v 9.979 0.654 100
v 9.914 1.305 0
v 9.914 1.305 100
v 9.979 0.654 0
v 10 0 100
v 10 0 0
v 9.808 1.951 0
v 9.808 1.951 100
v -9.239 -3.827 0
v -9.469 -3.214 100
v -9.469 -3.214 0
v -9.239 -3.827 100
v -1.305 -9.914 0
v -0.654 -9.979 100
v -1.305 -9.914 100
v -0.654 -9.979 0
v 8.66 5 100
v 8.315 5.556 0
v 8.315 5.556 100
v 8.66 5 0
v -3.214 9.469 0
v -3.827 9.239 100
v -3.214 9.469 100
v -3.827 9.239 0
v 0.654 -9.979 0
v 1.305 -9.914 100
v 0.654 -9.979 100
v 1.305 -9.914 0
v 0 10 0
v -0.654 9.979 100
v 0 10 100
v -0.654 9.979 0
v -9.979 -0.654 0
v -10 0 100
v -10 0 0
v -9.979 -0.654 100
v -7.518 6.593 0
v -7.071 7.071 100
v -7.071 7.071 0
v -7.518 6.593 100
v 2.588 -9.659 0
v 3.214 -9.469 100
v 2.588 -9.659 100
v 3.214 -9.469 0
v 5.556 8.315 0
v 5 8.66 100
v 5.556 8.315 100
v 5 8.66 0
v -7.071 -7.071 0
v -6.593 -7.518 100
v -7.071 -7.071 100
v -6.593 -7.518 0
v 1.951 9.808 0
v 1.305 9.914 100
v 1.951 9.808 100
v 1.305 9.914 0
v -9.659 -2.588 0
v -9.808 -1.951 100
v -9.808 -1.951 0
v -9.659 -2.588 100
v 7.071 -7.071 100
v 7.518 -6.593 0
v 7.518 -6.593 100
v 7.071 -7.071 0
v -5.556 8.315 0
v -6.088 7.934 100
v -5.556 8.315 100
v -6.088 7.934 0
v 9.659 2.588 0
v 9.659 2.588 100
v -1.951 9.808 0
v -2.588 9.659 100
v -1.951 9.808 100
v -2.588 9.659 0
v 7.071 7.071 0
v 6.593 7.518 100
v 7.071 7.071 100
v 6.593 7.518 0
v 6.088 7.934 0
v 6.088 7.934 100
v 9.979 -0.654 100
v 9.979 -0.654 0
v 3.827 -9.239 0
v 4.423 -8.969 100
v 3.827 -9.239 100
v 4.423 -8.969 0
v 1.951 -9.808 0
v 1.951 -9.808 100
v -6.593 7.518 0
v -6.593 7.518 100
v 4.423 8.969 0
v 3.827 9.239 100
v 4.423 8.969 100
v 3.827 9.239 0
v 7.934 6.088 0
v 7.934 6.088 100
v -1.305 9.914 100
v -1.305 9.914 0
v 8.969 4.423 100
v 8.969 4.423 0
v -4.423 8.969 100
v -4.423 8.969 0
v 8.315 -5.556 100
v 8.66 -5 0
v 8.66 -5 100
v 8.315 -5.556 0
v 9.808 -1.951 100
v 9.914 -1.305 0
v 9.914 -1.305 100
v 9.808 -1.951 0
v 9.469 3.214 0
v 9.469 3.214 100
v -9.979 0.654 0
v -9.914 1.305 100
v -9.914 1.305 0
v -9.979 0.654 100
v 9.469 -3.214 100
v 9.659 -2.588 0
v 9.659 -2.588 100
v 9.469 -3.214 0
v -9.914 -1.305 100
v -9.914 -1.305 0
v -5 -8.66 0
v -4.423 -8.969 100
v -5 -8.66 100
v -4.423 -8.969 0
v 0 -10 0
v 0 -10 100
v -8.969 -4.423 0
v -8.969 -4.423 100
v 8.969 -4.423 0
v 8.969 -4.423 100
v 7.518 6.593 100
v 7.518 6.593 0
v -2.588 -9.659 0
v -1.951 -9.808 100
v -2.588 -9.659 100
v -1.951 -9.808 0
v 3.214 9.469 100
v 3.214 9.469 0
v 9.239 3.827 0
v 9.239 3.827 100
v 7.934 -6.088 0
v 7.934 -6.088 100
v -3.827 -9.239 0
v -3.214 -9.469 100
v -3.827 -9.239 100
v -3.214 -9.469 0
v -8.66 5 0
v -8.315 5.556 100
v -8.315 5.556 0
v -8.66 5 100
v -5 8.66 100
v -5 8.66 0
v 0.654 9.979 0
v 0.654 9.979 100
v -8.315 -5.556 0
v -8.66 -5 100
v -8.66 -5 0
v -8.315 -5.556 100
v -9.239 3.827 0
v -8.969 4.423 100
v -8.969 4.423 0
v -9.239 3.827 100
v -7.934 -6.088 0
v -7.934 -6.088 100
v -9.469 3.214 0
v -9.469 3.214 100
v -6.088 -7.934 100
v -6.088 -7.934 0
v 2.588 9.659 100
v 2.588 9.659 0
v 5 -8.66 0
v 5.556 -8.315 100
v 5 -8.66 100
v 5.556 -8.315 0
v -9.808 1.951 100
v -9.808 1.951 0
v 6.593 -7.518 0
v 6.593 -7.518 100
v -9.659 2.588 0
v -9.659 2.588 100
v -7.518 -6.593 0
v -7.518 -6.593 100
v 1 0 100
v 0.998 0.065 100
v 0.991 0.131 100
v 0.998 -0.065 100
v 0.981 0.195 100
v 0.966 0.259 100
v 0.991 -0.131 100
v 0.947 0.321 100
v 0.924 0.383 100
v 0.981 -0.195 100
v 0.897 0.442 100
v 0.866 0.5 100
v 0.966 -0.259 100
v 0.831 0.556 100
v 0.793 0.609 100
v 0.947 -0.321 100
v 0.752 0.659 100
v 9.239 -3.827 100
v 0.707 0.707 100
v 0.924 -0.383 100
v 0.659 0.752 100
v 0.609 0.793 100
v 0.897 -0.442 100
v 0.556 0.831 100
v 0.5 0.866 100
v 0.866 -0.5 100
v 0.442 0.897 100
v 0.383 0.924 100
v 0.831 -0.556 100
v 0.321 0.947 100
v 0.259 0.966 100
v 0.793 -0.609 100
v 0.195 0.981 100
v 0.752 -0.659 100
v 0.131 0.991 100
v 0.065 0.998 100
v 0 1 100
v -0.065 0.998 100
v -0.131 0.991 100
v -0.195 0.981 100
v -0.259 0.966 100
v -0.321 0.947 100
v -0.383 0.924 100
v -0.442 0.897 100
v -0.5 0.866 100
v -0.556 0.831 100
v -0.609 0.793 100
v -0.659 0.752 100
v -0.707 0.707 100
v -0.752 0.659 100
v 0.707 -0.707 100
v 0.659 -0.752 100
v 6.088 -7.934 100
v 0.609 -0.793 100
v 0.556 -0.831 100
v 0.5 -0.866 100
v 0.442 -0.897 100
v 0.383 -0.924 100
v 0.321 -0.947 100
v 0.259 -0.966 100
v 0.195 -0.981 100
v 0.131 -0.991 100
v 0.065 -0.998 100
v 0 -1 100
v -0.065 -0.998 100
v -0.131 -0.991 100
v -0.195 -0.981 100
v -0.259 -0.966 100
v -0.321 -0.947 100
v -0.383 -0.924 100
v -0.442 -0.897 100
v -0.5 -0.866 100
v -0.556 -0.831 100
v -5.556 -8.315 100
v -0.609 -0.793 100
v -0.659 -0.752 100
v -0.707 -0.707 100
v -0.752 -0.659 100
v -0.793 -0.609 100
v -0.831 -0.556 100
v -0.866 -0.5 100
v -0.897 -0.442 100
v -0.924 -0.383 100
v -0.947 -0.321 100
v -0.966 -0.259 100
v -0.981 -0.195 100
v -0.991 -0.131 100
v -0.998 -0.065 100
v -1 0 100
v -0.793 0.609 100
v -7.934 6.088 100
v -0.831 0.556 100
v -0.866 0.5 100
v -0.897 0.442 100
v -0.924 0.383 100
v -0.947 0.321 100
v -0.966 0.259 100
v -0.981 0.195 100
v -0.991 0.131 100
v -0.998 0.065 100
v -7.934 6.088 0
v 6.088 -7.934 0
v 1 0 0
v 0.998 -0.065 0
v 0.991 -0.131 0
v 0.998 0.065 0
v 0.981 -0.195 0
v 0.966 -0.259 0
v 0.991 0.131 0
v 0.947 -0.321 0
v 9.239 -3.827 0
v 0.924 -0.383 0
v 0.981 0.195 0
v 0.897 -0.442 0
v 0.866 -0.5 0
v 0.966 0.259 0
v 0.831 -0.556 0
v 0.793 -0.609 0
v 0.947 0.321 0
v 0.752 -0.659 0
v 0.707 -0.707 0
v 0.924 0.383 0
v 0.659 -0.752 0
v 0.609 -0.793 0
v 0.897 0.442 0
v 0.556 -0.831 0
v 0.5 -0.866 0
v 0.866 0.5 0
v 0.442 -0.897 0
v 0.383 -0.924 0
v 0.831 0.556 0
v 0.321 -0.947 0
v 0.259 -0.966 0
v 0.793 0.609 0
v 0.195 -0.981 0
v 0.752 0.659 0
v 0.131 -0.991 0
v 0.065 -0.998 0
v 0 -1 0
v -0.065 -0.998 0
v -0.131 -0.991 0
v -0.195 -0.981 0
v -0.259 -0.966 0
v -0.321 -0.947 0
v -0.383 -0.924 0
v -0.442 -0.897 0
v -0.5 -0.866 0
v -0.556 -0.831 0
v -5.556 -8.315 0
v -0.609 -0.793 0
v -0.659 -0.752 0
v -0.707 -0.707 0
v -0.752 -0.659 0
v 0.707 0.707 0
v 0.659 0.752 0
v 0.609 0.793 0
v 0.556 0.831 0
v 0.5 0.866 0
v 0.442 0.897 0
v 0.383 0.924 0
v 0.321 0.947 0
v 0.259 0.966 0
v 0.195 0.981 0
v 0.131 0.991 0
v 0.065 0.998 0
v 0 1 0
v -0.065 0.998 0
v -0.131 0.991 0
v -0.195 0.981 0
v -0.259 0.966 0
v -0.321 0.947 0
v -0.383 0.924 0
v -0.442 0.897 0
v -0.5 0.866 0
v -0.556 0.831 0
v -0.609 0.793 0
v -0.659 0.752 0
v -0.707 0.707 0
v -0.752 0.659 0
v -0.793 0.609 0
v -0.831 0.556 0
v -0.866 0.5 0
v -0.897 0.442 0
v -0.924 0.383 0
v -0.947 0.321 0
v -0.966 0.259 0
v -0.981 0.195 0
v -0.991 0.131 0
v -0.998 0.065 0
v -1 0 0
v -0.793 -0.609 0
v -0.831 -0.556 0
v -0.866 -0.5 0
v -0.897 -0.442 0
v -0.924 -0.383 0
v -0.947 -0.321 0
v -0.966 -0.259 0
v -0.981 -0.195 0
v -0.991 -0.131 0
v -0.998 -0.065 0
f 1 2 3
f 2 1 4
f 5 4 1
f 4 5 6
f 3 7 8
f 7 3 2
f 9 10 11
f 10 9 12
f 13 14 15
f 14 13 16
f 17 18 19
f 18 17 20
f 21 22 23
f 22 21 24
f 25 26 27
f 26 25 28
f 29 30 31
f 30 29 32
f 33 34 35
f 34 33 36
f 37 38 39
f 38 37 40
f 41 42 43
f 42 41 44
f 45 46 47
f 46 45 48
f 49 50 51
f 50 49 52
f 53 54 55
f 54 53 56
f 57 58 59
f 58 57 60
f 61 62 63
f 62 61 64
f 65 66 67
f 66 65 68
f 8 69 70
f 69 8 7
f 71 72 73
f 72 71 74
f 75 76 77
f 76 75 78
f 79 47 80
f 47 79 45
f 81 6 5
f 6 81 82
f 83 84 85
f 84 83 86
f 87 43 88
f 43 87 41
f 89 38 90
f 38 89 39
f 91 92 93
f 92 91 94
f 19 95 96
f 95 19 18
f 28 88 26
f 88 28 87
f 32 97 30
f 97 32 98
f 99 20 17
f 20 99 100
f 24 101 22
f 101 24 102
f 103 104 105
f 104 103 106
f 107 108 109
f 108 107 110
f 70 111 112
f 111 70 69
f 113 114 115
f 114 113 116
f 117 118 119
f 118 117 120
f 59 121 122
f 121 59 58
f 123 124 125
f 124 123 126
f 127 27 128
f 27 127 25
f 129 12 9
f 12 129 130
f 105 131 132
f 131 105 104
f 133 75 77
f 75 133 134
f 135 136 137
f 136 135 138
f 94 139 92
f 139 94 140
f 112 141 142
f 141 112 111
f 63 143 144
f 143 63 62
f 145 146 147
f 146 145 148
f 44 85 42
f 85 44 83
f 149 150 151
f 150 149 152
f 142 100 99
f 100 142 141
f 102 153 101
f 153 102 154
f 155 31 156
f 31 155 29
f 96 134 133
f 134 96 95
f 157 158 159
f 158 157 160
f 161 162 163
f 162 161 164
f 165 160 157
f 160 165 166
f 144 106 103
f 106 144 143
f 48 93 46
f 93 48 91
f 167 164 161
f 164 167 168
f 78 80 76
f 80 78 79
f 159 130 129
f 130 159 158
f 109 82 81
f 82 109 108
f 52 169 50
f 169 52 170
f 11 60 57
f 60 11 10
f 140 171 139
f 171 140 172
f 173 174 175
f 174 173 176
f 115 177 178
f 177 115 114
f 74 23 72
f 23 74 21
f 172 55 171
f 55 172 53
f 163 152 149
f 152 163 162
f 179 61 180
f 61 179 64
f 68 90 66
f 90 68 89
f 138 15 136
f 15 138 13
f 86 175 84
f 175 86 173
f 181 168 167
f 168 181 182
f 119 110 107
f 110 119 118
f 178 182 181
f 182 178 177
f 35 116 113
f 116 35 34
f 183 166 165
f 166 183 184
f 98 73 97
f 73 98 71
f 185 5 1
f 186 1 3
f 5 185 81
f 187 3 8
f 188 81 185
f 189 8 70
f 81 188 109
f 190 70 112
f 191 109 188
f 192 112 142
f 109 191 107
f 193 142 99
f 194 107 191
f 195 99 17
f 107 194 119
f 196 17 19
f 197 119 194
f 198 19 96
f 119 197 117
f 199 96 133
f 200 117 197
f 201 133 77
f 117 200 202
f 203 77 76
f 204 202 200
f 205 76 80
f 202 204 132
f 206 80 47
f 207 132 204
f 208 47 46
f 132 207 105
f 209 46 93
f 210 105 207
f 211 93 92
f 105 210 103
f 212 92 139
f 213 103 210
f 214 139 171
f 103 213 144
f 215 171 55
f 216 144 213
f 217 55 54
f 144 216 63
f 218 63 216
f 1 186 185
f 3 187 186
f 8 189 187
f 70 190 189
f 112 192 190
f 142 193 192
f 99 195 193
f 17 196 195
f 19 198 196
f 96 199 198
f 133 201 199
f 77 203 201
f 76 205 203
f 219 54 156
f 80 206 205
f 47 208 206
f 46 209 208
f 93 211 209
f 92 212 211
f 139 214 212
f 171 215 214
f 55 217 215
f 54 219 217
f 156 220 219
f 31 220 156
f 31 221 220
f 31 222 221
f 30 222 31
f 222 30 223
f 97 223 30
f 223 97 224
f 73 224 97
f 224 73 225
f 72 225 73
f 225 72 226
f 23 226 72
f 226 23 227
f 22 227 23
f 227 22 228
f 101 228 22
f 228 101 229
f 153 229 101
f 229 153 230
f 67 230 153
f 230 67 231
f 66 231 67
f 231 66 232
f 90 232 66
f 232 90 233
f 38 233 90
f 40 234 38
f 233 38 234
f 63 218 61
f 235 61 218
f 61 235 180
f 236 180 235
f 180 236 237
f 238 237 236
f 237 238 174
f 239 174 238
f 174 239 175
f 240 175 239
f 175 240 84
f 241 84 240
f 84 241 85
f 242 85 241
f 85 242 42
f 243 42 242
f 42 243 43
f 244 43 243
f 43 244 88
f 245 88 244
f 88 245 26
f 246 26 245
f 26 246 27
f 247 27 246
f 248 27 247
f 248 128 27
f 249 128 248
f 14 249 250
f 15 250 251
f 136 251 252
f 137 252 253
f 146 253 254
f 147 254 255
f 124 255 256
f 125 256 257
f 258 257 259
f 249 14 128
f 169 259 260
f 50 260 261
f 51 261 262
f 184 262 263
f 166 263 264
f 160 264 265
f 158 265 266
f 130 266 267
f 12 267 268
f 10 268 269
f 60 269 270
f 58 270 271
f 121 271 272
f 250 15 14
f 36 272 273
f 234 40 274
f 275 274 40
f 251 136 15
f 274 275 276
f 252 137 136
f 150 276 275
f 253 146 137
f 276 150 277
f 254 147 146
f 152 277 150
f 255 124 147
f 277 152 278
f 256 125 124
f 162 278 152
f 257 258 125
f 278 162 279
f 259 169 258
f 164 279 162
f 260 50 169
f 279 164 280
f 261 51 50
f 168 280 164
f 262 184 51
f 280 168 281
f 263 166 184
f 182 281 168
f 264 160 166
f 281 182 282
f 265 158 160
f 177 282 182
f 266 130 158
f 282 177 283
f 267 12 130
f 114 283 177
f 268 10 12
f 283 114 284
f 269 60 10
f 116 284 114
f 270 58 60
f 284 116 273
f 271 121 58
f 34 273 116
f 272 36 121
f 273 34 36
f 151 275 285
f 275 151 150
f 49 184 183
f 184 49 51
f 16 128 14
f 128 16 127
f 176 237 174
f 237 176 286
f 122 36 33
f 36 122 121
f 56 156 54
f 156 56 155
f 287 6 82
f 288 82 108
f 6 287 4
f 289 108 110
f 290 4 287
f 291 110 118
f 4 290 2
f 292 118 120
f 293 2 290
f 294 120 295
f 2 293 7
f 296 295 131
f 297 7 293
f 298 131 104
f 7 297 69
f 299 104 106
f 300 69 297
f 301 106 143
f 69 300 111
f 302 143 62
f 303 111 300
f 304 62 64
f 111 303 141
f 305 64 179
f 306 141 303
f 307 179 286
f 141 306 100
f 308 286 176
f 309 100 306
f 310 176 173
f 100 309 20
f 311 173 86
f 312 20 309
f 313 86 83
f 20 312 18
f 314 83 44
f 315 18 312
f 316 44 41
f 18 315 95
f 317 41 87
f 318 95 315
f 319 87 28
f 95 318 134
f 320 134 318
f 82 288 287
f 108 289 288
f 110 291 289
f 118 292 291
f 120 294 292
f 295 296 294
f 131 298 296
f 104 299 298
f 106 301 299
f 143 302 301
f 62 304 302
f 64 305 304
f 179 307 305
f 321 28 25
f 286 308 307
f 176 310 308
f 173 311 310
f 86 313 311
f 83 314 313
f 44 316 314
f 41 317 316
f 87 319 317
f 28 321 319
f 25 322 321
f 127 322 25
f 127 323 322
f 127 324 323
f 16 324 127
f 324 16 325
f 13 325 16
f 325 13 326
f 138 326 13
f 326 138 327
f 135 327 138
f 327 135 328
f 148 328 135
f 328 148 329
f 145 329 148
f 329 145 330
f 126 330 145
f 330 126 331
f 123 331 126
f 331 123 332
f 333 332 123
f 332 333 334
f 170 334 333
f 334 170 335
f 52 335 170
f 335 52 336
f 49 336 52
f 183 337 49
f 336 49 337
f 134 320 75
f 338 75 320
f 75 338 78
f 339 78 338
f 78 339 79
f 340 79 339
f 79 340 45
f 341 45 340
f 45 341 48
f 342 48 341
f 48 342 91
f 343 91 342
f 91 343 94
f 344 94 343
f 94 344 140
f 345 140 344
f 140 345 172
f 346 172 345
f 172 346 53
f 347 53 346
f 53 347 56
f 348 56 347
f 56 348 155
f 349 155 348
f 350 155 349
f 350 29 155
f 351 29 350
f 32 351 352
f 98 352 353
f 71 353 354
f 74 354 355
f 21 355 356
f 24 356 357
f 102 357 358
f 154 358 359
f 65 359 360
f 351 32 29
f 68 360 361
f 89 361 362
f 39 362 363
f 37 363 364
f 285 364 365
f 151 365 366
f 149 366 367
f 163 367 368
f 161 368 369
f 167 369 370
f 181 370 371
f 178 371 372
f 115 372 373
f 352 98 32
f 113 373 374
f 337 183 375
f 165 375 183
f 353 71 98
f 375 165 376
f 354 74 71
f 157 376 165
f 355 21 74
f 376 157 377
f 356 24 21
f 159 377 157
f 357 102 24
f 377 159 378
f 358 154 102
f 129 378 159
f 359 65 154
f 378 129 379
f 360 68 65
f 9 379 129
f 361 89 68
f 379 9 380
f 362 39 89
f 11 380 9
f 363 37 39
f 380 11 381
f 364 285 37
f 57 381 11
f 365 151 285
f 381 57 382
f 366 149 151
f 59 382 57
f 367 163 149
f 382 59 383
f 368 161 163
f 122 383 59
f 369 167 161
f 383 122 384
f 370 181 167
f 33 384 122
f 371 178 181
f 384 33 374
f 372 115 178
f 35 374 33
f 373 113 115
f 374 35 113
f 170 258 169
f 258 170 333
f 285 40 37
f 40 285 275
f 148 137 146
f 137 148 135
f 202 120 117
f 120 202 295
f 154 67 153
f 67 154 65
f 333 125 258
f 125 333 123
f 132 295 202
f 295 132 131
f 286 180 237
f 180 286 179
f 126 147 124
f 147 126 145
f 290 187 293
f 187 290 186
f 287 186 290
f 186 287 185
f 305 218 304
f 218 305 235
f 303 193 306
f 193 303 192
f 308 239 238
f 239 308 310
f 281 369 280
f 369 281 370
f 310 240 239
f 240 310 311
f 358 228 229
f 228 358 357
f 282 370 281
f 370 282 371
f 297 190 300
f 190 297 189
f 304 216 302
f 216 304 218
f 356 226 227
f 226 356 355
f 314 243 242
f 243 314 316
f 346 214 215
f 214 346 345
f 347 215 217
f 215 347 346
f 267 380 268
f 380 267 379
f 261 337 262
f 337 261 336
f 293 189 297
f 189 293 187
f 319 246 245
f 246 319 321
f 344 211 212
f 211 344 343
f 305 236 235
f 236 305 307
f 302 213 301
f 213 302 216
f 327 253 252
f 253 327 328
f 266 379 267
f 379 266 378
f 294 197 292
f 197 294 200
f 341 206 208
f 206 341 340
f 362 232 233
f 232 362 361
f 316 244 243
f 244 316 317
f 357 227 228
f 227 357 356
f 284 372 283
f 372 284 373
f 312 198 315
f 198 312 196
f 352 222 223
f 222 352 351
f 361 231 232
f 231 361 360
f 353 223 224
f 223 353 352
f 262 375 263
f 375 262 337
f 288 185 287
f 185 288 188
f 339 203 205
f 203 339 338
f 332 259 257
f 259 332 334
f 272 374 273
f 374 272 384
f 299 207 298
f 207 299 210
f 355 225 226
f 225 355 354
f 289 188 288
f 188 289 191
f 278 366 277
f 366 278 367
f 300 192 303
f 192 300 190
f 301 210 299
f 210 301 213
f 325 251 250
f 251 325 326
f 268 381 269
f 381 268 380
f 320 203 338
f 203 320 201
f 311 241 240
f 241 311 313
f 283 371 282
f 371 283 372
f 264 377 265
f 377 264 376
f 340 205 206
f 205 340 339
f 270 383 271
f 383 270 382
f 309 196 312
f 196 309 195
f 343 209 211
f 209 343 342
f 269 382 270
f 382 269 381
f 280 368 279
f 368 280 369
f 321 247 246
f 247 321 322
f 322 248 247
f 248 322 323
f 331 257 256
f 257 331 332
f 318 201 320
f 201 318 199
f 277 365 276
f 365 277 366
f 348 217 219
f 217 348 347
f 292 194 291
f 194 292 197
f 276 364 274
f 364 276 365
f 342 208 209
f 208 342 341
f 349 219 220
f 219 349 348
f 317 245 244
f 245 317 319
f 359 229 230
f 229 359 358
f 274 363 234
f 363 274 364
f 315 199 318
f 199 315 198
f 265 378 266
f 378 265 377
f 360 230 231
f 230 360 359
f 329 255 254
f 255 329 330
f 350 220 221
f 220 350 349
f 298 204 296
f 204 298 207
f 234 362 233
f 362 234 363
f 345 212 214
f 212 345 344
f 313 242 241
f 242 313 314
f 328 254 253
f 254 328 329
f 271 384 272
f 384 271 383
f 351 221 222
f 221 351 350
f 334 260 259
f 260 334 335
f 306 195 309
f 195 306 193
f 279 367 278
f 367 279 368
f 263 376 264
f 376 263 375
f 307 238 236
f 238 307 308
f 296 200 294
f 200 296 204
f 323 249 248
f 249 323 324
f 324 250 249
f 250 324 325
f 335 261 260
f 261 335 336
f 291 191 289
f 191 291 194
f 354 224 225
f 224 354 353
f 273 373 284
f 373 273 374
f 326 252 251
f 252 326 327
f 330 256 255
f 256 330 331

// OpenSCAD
p0_radius = 10.0;
p0_length = 100.0;
p1_radius = 1.0;
p1_height = 100.2;

module part_0() {
  cylinder(r=p0_radius, h=p0_length, $fn=96);
}

module part_1() {
  cylinder(r=p1_radius, h=p1_height, $fn=96);
}

difference() {
  part_0();
  part_1();
}
